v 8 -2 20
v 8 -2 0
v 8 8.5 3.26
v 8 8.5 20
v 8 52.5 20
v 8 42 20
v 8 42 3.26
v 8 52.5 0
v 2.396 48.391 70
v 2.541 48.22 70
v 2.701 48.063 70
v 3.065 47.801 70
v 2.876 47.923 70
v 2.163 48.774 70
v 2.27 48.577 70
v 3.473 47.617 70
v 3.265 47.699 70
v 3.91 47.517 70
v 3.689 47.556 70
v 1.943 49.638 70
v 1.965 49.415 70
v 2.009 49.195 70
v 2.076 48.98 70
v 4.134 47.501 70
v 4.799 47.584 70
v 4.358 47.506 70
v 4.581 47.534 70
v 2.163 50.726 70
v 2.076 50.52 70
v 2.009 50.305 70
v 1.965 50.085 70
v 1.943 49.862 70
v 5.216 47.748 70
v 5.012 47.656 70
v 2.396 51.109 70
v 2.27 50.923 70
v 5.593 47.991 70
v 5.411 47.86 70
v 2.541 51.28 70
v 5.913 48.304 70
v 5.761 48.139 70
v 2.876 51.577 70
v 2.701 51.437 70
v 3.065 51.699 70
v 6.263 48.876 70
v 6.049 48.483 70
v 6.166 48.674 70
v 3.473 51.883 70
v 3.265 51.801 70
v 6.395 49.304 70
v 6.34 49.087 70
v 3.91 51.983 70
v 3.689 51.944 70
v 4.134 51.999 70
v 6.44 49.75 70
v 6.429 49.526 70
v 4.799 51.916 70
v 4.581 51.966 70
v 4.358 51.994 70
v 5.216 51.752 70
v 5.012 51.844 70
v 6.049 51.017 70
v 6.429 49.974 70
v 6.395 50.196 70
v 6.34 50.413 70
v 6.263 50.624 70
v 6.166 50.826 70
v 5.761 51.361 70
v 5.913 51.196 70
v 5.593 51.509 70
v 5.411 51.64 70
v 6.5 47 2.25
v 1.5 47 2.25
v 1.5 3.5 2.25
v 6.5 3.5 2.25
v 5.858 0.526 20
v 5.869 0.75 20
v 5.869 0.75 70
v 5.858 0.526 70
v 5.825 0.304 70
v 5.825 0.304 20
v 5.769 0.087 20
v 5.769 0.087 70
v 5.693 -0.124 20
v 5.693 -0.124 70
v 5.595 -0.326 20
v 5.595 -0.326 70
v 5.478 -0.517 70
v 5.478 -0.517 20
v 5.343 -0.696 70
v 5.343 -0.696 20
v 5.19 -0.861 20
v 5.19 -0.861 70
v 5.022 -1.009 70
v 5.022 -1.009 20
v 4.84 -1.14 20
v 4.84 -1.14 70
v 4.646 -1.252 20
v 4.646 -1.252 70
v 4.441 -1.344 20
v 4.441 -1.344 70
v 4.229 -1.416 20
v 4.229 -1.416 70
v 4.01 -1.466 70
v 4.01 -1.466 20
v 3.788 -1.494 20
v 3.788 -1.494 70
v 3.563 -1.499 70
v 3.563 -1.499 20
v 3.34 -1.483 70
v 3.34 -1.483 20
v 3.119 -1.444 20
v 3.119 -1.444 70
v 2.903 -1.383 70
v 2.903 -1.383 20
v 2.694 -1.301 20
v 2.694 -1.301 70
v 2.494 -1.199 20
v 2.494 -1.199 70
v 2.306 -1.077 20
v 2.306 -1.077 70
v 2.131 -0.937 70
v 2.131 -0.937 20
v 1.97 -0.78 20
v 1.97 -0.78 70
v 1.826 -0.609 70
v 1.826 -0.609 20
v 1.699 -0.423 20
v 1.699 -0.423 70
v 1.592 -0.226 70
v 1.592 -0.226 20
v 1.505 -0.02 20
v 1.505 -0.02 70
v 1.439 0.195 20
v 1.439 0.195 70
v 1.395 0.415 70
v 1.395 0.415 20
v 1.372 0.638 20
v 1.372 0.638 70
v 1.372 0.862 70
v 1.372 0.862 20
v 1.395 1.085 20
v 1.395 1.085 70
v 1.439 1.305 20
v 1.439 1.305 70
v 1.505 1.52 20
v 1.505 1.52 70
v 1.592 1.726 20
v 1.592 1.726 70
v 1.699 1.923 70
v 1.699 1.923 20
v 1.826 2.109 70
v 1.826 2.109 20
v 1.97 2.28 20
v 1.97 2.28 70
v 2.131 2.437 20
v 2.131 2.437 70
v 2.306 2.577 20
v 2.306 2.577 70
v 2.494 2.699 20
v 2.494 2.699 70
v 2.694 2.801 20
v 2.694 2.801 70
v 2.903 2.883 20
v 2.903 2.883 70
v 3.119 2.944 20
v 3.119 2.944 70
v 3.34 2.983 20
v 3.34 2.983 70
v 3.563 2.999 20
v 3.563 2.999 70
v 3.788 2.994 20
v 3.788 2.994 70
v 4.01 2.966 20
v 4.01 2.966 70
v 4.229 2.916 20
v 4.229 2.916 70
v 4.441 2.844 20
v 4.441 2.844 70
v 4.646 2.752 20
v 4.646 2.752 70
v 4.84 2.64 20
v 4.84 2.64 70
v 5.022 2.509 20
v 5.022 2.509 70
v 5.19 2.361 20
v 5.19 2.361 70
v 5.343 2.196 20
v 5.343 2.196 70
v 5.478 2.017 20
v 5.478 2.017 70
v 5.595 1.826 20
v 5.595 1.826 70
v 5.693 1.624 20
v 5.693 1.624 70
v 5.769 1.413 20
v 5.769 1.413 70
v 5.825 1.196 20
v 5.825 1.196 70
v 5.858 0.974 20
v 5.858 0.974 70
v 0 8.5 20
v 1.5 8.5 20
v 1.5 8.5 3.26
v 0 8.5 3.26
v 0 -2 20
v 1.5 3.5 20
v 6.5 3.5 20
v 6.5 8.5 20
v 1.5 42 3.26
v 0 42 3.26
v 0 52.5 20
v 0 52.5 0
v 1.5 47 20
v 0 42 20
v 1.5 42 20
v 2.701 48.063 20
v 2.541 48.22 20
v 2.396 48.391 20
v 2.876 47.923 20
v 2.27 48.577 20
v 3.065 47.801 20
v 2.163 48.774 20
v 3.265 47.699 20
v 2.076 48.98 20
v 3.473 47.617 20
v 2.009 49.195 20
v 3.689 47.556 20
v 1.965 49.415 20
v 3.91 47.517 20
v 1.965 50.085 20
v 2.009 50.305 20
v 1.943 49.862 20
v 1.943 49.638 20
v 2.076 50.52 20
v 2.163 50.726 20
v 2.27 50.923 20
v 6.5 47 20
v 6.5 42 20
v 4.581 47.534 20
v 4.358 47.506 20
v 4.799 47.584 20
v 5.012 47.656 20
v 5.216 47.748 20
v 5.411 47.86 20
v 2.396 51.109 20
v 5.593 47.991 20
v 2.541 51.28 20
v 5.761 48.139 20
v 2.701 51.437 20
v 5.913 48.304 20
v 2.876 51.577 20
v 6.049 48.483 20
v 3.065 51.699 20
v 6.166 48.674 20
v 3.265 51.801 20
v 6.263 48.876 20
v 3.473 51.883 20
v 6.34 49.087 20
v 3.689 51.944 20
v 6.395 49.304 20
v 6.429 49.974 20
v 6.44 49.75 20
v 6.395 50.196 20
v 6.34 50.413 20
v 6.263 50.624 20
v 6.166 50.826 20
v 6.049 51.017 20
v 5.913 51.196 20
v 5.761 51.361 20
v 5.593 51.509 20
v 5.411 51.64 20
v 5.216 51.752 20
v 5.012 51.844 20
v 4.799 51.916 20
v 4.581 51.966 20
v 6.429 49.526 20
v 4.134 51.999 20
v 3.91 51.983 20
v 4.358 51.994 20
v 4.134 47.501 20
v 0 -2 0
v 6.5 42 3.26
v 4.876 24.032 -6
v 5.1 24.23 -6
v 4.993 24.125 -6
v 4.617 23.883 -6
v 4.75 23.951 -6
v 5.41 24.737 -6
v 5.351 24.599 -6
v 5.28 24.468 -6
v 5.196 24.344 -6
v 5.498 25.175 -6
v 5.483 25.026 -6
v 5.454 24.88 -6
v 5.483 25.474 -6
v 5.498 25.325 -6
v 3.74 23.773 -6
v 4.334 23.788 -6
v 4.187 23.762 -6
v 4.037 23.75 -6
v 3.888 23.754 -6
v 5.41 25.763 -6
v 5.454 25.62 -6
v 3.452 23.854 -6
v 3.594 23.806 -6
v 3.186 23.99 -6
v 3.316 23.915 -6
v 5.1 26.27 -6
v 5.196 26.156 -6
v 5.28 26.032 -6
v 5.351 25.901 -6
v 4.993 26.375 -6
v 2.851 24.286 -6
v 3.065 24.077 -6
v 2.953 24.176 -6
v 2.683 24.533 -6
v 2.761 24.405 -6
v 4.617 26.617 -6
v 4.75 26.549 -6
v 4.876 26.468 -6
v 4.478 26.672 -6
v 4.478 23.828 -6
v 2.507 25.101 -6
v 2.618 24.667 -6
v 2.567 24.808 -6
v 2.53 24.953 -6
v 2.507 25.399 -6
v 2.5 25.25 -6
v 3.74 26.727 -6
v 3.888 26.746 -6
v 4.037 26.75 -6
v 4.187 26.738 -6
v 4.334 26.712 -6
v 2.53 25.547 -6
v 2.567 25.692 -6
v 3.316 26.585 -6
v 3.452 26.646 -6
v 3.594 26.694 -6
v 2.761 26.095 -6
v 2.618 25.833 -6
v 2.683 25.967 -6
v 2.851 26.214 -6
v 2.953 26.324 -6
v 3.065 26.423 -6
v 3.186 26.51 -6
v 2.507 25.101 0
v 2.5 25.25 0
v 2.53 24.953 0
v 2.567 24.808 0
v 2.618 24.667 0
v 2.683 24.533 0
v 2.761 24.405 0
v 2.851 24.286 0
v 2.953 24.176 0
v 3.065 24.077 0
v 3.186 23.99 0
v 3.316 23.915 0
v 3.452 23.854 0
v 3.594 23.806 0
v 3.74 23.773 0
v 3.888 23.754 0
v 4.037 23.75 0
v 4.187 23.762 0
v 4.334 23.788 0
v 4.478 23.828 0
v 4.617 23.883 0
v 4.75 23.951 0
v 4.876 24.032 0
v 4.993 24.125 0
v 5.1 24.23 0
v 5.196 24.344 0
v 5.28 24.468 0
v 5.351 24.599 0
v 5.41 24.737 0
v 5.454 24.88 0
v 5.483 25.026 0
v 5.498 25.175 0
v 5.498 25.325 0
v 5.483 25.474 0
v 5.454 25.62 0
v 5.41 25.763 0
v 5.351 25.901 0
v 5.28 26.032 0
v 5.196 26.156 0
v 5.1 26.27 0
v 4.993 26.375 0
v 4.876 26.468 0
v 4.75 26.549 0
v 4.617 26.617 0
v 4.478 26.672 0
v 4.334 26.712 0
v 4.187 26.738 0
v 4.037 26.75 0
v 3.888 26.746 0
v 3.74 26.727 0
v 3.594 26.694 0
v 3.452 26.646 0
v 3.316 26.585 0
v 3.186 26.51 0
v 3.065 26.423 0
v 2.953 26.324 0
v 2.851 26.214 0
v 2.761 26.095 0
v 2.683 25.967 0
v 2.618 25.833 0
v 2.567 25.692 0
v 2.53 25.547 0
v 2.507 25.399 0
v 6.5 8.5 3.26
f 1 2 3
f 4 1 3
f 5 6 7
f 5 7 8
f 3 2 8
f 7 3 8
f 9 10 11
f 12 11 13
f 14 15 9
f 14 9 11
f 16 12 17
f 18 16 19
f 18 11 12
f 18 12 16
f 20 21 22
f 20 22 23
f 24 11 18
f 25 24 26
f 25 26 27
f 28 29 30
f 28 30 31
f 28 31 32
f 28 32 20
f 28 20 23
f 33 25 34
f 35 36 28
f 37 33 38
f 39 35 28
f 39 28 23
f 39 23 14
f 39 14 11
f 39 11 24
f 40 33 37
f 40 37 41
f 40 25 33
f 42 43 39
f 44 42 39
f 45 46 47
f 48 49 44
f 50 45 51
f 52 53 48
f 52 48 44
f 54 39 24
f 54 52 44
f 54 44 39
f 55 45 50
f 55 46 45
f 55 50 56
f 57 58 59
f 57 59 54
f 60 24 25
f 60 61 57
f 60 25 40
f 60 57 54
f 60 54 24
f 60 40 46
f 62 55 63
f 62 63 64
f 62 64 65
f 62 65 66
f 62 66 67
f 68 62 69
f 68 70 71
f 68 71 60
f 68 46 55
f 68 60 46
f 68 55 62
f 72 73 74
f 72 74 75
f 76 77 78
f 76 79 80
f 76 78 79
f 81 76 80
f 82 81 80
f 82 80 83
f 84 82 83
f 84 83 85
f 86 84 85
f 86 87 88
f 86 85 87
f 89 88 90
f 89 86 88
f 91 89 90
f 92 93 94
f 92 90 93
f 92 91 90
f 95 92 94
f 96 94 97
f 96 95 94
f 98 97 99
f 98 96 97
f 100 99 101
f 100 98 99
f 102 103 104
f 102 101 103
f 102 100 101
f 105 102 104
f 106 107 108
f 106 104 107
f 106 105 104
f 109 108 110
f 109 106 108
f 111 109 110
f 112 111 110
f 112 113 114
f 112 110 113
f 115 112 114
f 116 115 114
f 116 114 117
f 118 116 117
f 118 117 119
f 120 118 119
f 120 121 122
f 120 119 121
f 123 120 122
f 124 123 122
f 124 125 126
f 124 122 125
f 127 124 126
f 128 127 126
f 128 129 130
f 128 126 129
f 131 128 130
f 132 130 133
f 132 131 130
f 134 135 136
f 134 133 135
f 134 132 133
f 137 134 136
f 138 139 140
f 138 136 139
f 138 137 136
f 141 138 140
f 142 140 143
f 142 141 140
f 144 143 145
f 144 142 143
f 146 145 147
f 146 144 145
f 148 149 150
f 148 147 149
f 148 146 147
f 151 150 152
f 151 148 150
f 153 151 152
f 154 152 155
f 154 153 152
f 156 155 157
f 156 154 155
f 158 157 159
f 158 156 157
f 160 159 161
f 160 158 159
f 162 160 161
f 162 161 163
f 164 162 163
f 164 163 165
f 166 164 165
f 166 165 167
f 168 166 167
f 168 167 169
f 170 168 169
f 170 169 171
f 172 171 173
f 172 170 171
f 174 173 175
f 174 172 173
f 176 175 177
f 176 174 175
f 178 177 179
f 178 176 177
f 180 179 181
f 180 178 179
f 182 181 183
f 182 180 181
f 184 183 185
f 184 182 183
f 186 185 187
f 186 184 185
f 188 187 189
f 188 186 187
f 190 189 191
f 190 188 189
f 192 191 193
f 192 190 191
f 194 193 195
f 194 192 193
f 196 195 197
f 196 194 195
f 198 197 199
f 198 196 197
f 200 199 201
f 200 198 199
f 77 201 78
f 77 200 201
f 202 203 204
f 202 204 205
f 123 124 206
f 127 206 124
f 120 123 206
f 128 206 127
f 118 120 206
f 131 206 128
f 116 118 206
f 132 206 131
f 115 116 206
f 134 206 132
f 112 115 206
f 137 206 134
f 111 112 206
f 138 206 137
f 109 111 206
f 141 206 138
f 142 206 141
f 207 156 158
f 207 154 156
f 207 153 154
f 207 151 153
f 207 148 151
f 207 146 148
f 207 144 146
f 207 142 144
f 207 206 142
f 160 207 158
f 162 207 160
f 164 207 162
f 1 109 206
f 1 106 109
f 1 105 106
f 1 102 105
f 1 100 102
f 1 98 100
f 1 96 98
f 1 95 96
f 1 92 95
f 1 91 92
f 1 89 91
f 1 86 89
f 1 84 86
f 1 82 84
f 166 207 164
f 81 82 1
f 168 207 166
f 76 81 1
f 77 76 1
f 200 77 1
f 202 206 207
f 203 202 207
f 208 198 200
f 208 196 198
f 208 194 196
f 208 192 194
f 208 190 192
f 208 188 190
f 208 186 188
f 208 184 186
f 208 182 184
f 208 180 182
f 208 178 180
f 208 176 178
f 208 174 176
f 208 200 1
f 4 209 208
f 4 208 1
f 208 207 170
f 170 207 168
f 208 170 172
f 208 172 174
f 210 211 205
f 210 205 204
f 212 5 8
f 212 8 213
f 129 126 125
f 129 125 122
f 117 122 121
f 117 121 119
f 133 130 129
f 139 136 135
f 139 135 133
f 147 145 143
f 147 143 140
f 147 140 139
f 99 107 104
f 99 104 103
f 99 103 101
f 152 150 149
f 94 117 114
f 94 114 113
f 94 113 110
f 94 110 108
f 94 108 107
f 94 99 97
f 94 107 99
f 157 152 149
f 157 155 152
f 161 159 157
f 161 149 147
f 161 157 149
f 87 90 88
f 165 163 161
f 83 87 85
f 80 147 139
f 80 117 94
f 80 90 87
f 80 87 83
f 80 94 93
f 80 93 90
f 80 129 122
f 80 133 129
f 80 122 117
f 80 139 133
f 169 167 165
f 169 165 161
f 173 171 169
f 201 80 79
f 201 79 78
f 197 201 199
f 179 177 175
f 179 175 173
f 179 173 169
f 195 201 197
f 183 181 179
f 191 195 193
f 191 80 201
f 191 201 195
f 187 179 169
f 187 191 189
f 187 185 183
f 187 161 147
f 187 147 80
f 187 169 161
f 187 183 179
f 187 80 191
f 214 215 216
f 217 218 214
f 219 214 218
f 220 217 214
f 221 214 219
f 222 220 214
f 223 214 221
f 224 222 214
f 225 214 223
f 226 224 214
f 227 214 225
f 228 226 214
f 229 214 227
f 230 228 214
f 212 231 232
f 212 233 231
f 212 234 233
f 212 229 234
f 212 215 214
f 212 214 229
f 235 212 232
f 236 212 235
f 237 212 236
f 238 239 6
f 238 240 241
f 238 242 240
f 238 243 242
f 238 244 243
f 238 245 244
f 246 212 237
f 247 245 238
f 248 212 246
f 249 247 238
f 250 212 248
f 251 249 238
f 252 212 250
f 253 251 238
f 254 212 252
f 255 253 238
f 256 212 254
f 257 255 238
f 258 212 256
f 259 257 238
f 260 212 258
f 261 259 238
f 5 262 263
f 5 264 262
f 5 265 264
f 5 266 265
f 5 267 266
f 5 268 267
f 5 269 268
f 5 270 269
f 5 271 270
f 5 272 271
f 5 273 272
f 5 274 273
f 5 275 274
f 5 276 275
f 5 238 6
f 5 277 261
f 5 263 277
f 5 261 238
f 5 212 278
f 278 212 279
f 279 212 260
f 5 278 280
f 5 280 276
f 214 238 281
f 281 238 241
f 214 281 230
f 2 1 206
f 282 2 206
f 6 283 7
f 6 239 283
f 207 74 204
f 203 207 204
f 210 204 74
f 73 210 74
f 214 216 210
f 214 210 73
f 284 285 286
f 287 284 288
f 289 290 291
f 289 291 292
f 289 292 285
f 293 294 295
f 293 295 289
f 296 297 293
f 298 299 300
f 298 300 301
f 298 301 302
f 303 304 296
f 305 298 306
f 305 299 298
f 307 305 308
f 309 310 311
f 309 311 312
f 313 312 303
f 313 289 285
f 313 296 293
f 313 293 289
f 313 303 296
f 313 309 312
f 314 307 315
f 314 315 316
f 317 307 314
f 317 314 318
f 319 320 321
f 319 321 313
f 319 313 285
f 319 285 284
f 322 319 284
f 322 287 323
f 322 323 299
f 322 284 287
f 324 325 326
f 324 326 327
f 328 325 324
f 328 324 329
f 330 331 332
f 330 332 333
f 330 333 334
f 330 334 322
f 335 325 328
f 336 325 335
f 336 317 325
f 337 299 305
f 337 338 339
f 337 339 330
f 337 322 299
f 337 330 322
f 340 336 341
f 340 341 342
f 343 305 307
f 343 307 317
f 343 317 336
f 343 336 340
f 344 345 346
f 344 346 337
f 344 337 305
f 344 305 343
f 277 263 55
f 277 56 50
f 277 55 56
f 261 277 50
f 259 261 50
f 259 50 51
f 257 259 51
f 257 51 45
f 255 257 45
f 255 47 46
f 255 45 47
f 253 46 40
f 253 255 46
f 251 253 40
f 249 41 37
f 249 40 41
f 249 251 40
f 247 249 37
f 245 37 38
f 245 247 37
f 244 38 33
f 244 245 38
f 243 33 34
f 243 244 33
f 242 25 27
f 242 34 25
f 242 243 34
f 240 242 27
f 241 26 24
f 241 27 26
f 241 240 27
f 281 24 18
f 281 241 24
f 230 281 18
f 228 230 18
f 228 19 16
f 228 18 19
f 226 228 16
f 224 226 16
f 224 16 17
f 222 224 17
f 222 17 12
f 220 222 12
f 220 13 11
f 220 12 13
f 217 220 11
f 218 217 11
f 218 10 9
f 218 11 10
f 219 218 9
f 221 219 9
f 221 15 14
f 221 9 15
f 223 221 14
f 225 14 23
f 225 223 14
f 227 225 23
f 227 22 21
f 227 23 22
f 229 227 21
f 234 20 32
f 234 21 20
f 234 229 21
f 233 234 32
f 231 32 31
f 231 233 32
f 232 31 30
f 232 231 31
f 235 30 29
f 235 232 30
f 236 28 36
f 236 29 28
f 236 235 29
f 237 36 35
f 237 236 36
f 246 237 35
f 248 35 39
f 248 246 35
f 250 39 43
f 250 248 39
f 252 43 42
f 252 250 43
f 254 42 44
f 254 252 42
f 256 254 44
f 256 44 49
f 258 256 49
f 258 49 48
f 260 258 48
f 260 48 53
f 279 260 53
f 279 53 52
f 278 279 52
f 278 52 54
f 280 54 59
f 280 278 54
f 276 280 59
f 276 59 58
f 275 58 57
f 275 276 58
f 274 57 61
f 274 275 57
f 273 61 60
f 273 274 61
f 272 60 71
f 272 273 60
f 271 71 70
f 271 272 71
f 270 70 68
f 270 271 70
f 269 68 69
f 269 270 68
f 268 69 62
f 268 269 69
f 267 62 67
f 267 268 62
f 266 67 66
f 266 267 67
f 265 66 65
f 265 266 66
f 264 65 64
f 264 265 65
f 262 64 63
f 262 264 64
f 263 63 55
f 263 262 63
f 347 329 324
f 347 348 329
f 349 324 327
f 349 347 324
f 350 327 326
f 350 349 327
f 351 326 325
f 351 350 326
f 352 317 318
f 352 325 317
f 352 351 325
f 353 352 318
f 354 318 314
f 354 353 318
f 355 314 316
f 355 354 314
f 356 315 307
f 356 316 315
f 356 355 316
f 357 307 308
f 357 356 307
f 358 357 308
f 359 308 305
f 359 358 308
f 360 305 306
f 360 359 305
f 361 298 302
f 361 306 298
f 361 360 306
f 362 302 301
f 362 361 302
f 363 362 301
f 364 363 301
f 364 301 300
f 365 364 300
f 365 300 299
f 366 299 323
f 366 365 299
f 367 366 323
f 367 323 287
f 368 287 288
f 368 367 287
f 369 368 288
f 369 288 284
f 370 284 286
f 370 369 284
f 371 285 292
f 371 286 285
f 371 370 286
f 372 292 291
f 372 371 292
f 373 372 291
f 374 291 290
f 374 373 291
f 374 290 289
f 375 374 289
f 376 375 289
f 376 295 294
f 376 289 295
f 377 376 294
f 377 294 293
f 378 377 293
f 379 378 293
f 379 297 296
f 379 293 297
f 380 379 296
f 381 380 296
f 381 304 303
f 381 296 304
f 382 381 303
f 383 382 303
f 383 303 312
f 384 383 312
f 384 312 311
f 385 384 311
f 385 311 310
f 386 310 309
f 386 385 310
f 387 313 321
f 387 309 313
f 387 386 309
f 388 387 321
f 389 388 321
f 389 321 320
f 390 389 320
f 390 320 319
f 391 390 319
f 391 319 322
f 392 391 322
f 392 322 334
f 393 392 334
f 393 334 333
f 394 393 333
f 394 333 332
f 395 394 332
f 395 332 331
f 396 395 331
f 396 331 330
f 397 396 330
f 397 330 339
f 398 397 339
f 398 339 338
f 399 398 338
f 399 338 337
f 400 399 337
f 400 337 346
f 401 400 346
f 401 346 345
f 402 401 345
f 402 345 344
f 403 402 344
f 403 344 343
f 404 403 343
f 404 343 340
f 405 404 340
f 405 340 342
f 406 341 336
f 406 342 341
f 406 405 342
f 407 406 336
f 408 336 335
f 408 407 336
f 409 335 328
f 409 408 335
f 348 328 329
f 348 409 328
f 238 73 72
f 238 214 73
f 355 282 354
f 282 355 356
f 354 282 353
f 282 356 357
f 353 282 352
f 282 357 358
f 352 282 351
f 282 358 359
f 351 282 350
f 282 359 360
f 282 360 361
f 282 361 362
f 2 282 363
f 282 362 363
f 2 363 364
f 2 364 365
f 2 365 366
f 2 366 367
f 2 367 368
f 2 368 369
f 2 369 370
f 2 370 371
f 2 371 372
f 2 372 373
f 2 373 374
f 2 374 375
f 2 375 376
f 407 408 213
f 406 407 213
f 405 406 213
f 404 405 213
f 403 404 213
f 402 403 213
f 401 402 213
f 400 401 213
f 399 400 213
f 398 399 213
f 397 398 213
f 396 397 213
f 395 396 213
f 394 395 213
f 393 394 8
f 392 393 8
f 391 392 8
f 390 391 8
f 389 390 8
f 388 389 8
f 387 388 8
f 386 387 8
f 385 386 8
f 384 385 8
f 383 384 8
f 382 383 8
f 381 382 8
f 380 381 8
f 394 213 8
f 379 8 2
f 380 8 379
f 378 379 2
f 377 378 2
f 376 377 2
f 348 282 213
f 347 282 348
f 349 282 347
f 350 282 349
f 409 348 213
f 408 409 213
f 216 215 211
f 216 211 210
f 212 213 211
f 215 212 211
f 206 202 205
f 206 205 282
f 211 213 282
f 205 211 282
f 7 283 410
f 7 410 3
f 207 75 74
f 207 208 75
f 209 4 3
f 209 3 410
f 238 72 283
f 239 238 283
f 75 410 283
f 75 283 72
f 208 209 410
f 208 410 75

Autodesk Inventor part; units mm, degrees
ref_plane "YZ Plane" through (0, 0, 0) normal (1, 0, 0) x (0, 1, 0)
ref_plane "XZ Plane" through (0, 0, 0) normal (0, 1, 0) x (-1, 0, 0)
ref_plane "XY Plane" through (0, 0, 0) normal (0, 0, 1) x (1, 0, 0)
sketch "Sketch1" plane through (0, 0, 0) normal (0, 0, 1) x (1, 0, 0)
  line L0 (0, 0) -> (8, 0)
  line L1 (8, 0) -> (8, 50.5)
  line L2 (8, 50.5) -> (0, 50.5)
  line L3 (0, 50.5) -> (0, 0)
  dimension "d0" = 8
  dimension "d1" = 50.5
extrude "Extrusion1" add sketch "Sketch1" along normal blind 20
sketch "Sketch2" plane through (0, 0, 20) normal (0, 0, 1) x (1, 0, 0)
  line L0 (8, 0) -> (8, 50.5) projected
  line L1 (0, 42) -> (8, 42)
  line L2 (8, 42) -> (8, 8.5)
  line L3 (8, 8.5) -> (0, 8.5)
  line L4 (0, 8.5) -> (0, 42)
  line L5 (8, 50.5) -> (0, 50.5) projected
  line L6 (0, 0) -> (8, 0) projected
  dimension "d4" = 33.5
  dimension "d5" = 8.5
  dimension "d6" = 8.5
extrude "Extrusion2" cut sketch "Sketch2" against normal blind 16.74
sketch "Sketch3" plane through (0, 0, 20) normal (0, 0, 1) x (1, 0, 0)
  line L0 (1.5, 47) -> (6.5, 47)
  line L1 (6.5, 47) -> (6.5, 3.5)
  line L2 (6.5, 3.5) -> (1.5, 3.5)
  line L3 (1.5, 3.5) -> (1.5, 47)
  line L4 (0, 50.5) -> (0, 42) projected
  line L5 (0, 42) -> (8, 42) projected
  line L6 (8, 8.5) -> (0, 8.5) projected
  point P0 (0, 0)
  dimension "d9" = 5
  dimension "d10" = 1.5
  dimension "d11" = 5
  dimension "d12" = 5
extrude "Extrusion3" cut sketch "Sketch3" against normal blind 17.75
sketch "Sketch4" plane through (0, 0, 20) normal (0, 0, 1) x (1, 0, 0)
  line L0 (8, 50.5) -> (0, 50.5) projected
  line L1 (0, 50.5) -> (8, 50.5)
  line L2 (8, 50.5) -> (8, 52.5)
  line L3 (8, 52.5) -> (0, 52.5)
  line L4 (0, 52.5) -> (0, 50.5)
  line L5 (0, 0) -> (8, 0) projected
  line L6 (0, 0) -> (8, 0)
  line L7 (8, 0) -> (8, -2)
  line L8 (8, -2) -> (0, -2)
  line L9 (0, -2) -> (0, 0)
  dimension "d15" = 2
extrude "Extrusion4" add sketch "Sketch4" against normal up to surface (20 mm away)
sketch "Sketch5" plane through (0, 0, 20) normal (0, 0, 1) x (1, 0, 0)
  circle A0 centre (4.1899, 49.75) radius 2.25
  circle A1 centre (3.6194, 0.75) radius 2.25
  line L0 (0, -2) -> (8, -2) projected
  line L1 (6.5, 3.5) -> (1.5, 3.5) projected
  line L2 (1.5, 47) -> (6.5, 47) projected
  point P0 (0, 0)
  dimension "d18" = 5.5
  dimension "d19" = 4.5
  dimension "d20" = 2.75
  dimension "d21" = 2.75
extrude "Extrusion5" add sketch "Sketch5" along normal blind 50
sketch "Sketch6" plane through (0, 0, 0) normal (0, 0, -1) x (-1, 0, 0)
  line L0 (0, -2) -> (0, 52.5) projected
  line L1 (-8, -2) -> (-8, 52.5) projected
  circle A0 centre (-4, 25.25) radius 1.5
  line L2 (-8, -2) -> (0, -2) projected
  line L3 (0, 52.5) -> (-8, 52.5) projected
  point P0 (0, 0)
  dimension "d24" = 8
  dimension "d25" = 4
  dimension "d26" = 3
  dimension "d27" = 54.5
  dimension "d28" = 27.25
extrude "Extrusion6" add sketch "Sketch6" along normal blind 6 contours A0
properties part number "Stand Lower covet"
